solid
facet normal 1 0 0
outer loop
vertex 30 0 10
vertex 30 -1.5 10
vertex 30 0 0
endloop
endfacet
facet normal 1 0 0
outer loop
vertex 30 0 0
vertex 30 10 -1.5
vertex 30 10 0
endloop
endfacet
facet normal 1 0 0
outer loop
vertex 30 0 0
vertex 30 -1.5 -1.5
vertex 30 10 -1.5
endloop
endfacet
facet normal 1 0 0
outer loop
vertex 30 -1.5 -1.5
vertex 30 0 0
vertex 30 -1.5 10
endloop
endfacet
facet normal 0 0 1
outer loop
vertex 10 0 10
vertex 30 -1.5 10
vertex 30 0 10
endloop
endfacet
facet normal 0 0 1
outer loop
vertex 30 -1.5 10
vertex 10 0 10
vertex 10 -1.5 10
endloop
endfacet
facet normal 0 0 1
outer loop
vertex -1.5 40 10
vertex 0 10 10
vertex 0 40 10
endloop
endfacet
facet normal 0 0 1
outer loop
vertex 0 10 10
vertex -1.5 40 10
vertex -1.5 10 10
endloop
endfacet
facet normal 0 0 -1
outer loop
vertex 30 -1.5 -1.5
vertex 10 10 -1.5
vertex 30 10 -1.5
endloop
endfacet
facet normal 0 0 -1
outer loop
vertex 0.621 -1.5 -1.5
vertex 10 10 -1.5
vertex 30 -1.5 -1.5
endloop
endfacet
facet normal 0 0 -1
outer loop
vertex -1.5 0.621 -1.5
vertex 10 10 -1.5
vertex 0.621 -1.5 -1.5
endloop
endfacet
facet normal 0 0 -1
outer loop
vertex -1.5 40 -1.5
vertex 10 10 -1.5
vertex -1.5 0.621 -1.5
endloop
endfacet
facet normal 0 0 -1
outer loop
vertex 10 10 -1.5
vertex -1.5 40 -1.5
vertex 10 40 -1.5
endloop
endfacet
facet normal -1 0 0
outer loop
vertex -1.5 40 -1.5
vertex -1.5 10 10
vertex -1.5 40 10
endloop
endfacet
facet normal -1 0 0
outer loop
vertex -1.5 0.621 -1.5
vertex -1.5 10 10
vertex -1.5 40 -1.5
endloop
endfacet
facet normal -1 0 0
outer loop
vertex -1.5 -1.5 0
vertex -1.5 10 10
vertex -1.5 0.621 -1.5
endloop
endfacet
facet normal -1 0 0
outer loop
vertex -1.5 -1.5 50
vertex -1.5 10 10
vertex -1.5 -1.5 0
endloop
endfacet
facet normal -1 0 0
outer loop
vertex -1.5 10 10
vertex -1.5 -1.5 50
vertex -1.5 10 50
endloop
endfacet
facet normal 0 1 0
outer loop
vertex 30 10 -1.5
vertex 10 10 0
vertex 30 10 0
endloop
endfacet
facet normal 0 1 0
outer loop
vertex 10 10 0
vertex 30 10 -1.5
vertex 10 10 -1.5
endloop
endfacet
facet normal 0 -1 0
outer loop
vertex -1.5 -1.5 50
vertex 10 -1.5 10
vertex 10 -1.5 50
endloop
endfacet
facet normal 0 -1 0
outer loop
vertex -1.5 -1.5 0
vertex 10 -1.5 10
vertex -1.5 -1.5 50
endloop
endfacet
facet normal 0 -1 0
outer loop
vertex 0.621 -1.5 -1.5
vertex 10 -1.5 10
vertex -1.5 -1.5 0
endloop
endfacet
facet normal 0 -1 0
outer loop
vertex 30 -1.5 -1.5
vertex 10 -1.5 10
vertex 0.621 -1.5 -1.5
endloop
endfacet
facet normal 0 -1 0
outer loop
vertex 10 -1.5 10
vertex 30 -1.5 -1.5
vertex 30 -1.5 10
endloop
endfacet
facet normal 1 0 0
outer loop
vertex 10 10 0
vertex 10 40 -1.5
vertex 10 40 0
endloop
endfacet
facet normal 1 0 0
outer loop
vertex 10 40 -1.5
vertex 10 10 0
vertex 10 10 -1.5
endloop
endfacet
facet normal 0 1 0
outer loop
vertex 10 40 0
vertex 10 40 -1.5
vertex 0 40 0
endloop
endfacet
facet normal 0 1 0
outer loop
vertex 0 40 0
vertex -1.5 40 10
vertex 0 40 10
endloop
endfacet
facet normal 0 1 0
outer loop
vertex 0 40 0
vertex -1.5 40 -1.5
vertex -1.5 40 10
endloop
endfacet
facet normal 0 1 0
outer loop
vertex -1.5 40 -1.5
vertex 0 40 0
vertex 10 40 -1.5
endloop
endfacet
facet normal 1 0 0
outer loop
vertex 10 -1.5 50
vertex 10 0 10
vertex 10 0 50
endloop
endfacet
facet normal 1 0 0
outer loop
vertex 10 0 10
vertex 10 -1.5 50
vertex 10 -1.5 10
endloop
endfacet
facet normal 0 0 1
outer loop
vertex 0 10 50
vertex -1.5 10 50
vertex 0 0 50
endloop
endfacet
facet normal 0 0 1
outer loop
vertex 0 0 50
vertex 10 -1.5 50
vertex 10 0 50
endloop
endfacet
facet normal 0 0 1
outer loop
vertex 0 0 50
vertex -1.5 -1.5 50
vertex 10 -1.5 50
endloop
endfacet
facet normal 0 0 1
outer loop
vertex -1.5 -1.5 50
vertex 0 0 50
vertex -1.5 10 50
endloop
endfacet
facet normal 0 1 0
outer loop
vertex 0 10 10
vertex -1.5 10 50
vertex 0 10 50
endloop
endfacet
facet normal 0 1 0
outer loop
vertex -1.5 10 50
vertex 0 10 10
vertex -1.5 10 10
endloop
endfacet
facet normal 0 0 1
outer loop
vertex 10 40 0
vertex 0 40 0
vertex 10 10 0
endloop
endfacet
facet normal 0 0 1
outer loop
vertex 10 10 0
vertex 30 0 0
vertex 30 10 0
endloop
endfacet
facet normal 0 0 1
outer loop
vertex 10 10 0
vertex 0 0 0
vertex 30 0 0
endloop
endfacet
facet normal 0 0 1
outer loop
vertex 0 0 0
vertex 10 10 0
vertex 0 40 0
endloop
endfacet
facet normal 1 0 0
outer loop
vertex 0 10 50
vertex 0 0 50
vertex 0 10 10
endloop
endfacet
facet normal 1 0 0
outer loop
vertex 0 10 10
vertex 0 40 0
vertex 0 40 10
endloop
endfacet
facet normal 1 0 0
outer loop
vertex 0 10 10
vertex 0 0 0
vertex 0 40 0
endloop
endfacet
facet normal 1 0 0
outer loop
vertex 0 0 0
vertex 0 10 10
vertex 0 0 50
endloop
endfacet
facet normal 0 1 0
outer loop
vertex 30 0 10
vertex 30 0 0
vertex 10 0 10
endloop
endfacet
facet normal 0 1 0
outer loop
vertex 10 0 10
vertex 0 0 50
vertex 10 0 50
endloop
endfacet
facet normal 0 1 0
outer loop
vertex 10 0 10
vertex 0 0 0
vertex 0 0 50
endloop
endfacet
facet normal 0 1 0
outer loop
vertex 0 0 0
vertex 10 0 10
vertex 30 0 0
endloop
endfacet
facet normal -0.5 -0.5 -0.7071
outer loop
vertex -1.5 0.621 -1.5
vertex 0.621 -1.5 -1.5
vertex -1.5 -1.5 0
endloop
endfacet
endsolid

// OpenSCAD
/**
 * CornerGurad.scad by Ron Tajima (ryosuke.tajima <at> gmail <dot> com)
 *
 * This corner guard is for orthogonal corner consists from three beam along x,y,z axis.
 * The inside corner is the coordinate origin.
 *
 * corner_gurad(length, width, thickness, inner_fillet, outer_fillet)
 *   length: Length from the inner face to the beam tip
 *   width: Beam width from the inner face to the wall edge
 *   thickness: thickness of each wall
 *   inner_fillet: Radius of inner fillet around axis (x,y,z).
 *   outer_fillet: Radius of outer fillet of each (x,y,z) beam.
 *   chamfer: make chamfer for outer corner if it is true.
 *
 */

// length for x direction (without the wall thickness)
length_x = 30;
// length for y direction (without the wall thickness)
length_y = 40;
// length for z direction (without the wall thickness)
length_z = 50;
// wall width of x side
width_x = 10;
// wall width of y side
width_y = 10;
// wall width of z side
width_z = 10;
// thickness of the wall with x-axis normal vector
thickness_x = 1.5;
// thickness of the wall with y-axis normal vector
thickness_y = 1.5;
// thickness of the wall with z-axis normal vector
thickness_z = 1.5;
// Radius of inner fillet with x-axis normal vector
inner_fillet_x = 3;
// Radius of inner fillet with y-axis normal vector
inner_fillet_y = 3;
// Radius of inner fillet with z-axis normal vector
inner_fillet_z = 3;
// Radius of outer fillet with x-axis normal vector
outer_fillet_x = 4;
// Radius of outer fillet with y-axis normal vector
outer_fillet_y = 4;
// Radius of outer fillet with z-axis normal vector
outer_fillet_z = 4;
// On/Off of corner chamfer
chamfer_flag = "On"; // [On, Off]

corner_guard(length=[length_x,length_y, length_z], width=[width_x,width_y,width_z], thickness=[thickness_x,thickness_y,thickness_z], inner_fillet=[inner_fillet_x,inner_fillet_y,inner_fillet_z], outer_fillet=[outer_fillet_x,outer_fillet_y,outer_fillet_z], chamfer=chamfer_flag);

// Corner guard
module corner_guard(length=[50,50,50], width=[10,10,10], thickness=[2,2,2], inner_fillet=[0,0,0], outer_fillet=[0, 0, 0], chamfer="On") {
    difference() {
	union() {
	    three_beams();
	    inner_fillet();
	}
	outer_fillet();
	if (chamfer=="On") {
	    corner_chamfer();
	}
    }
    // Main three beams
    module three_beams() {
	guard_length=length+thickness;
	guard_width=width+thickness;
	difference() {
	    union() {
		// Beam around X-axis
		difference() {
		    translate([-thickness[0], -thickness[1], -thickness[2]]) {
			cube(size=[length[0]+thickness[0], width[2]+thickness[1], width[1]+thickness[2]]);
		    }
		    translate([-2*thickness[0], width[0], width[0]]) {
			cube(size=[length[0], length[1], length[2]]);
		    }
		}
		// Beam around Y-axis
		difference() {
		    translate([-thickness[0], -thickness[1], -thickness[2]]) {
			cube(size=[width[2]+thickness[0], length[1]+thickness[1], width[0]+thickness[2]]);
		    }
		    translate([width[1], -2*thickness[1], width[1]]) {
			cube(size=[length[0], length[1], length[2]]);
		    }
		}
		// Beam around Z-axis
		difference() {
		    translate([-thickness[0], -thickness[1], -thickness[2]]) {
			cube(size=[width[1]+thickness[0], width[0]+thickness[1], length[2]+thickness[2]]);
		    }
		    translate([width[2], width[2], -2*thickness[2]]) {
			cube(size=[length[0], length[1], length[2]]);
		    }
		}
	    }
	    cube(size=guard_length);
	}
    }
    // Inner fillets
    module inner_fillet() {
	// Fillets around X-axis 
	translate([-thickness[0], width[0], width[0]] ) {
	    rotate([90, 0, 90]) {
		rounded_corner_3d(inner_fillet[0], thickness[0]);
	    }
	}
	// Fillets around Y-axis 
	translate([width[1], 0, width[1]] ) {
	    rotate([90, 0, 0]) {
		rounded_corner_3d(inner_fillet[1], thickness[1]);
	    }
	}
	// Fillets around Z-axis 
	translate([width[2], width[2], -thickness[2]] ) {
	    rotate([0, 0, 0]) {
		rounded_corner_3d(inner_fillet[2], thickness[2]);
	    }
	}
    }
    // Outer fillets
    module outer_fillet() {
	// Fillets around X-axis 
	translate([-thickness[0], length[1], width[0]]) {
	    rotate([-90, 0, -90]) {
		rounded_corner_3d(outer_fillet[1], thickness[0]);
	    }
	}
	translate([-thickness[0], width[0], length[2]]) {
	    rotate([-90, 0, -90]) {
		rounded_corner_3d(outer_fillet[2], thickness[0]);
	    }
	}
	// Fillets around Y-axis 
	translate([length[0], -thickness[1], width[1]]) {
	    rotate([0, 90, 90]) {
		rounded_corner_3d(outer_fillet[0], thickness[1]);
	    }
	}
	translate([width[1], -thickness[1], length[2]]) {
	    rotate([0, 90, 90]) {
		rounded_corner_3d(outer_fillet[2], thickness[1]);
	    }
	}
	// Fillets around Z-axis 
	translate([length[0], width[2], -thickness[2]]) {
	    rotate([0, 0, 180]) {
		rounded_corner_3d(outer_fillet[0], thickness[2]);
	    }
	}
	translate([width[2], length[1], -thickness[2]]) {
	    rotate([0, 0, 180]) {
		rounded_corner_3d(outer_fillet[1], thickness[2]);
	    }
	}
    }
    // Corner chamfer
    module corner_chamfer() {
	th = min(thickness[0],thickness[1],thickness[2]);
	rotate([-45,0,-45]) {
	    translate([0, 0, -10-th]) {
		cube([40,40,20], center=true);
	    }
	}
    }
}

// 2d fillet curve
module rounded_corner_2d(d, offset=0.001) {
    difference() {
	square([d+offset, d+offset]);
	translate([d, d]) {
	    circle(r=d,$fs=0.1);
	}
    }
}

// 3d fillet shape
module rounded_corner_3d(d,l,offset=0.001) {
    v = [-offset, -offset, -offset];
    translate(v) {
	linear_extrude(height=l+2*offset) {
	    rounded_corner_2d(d);
	}
    }
}
